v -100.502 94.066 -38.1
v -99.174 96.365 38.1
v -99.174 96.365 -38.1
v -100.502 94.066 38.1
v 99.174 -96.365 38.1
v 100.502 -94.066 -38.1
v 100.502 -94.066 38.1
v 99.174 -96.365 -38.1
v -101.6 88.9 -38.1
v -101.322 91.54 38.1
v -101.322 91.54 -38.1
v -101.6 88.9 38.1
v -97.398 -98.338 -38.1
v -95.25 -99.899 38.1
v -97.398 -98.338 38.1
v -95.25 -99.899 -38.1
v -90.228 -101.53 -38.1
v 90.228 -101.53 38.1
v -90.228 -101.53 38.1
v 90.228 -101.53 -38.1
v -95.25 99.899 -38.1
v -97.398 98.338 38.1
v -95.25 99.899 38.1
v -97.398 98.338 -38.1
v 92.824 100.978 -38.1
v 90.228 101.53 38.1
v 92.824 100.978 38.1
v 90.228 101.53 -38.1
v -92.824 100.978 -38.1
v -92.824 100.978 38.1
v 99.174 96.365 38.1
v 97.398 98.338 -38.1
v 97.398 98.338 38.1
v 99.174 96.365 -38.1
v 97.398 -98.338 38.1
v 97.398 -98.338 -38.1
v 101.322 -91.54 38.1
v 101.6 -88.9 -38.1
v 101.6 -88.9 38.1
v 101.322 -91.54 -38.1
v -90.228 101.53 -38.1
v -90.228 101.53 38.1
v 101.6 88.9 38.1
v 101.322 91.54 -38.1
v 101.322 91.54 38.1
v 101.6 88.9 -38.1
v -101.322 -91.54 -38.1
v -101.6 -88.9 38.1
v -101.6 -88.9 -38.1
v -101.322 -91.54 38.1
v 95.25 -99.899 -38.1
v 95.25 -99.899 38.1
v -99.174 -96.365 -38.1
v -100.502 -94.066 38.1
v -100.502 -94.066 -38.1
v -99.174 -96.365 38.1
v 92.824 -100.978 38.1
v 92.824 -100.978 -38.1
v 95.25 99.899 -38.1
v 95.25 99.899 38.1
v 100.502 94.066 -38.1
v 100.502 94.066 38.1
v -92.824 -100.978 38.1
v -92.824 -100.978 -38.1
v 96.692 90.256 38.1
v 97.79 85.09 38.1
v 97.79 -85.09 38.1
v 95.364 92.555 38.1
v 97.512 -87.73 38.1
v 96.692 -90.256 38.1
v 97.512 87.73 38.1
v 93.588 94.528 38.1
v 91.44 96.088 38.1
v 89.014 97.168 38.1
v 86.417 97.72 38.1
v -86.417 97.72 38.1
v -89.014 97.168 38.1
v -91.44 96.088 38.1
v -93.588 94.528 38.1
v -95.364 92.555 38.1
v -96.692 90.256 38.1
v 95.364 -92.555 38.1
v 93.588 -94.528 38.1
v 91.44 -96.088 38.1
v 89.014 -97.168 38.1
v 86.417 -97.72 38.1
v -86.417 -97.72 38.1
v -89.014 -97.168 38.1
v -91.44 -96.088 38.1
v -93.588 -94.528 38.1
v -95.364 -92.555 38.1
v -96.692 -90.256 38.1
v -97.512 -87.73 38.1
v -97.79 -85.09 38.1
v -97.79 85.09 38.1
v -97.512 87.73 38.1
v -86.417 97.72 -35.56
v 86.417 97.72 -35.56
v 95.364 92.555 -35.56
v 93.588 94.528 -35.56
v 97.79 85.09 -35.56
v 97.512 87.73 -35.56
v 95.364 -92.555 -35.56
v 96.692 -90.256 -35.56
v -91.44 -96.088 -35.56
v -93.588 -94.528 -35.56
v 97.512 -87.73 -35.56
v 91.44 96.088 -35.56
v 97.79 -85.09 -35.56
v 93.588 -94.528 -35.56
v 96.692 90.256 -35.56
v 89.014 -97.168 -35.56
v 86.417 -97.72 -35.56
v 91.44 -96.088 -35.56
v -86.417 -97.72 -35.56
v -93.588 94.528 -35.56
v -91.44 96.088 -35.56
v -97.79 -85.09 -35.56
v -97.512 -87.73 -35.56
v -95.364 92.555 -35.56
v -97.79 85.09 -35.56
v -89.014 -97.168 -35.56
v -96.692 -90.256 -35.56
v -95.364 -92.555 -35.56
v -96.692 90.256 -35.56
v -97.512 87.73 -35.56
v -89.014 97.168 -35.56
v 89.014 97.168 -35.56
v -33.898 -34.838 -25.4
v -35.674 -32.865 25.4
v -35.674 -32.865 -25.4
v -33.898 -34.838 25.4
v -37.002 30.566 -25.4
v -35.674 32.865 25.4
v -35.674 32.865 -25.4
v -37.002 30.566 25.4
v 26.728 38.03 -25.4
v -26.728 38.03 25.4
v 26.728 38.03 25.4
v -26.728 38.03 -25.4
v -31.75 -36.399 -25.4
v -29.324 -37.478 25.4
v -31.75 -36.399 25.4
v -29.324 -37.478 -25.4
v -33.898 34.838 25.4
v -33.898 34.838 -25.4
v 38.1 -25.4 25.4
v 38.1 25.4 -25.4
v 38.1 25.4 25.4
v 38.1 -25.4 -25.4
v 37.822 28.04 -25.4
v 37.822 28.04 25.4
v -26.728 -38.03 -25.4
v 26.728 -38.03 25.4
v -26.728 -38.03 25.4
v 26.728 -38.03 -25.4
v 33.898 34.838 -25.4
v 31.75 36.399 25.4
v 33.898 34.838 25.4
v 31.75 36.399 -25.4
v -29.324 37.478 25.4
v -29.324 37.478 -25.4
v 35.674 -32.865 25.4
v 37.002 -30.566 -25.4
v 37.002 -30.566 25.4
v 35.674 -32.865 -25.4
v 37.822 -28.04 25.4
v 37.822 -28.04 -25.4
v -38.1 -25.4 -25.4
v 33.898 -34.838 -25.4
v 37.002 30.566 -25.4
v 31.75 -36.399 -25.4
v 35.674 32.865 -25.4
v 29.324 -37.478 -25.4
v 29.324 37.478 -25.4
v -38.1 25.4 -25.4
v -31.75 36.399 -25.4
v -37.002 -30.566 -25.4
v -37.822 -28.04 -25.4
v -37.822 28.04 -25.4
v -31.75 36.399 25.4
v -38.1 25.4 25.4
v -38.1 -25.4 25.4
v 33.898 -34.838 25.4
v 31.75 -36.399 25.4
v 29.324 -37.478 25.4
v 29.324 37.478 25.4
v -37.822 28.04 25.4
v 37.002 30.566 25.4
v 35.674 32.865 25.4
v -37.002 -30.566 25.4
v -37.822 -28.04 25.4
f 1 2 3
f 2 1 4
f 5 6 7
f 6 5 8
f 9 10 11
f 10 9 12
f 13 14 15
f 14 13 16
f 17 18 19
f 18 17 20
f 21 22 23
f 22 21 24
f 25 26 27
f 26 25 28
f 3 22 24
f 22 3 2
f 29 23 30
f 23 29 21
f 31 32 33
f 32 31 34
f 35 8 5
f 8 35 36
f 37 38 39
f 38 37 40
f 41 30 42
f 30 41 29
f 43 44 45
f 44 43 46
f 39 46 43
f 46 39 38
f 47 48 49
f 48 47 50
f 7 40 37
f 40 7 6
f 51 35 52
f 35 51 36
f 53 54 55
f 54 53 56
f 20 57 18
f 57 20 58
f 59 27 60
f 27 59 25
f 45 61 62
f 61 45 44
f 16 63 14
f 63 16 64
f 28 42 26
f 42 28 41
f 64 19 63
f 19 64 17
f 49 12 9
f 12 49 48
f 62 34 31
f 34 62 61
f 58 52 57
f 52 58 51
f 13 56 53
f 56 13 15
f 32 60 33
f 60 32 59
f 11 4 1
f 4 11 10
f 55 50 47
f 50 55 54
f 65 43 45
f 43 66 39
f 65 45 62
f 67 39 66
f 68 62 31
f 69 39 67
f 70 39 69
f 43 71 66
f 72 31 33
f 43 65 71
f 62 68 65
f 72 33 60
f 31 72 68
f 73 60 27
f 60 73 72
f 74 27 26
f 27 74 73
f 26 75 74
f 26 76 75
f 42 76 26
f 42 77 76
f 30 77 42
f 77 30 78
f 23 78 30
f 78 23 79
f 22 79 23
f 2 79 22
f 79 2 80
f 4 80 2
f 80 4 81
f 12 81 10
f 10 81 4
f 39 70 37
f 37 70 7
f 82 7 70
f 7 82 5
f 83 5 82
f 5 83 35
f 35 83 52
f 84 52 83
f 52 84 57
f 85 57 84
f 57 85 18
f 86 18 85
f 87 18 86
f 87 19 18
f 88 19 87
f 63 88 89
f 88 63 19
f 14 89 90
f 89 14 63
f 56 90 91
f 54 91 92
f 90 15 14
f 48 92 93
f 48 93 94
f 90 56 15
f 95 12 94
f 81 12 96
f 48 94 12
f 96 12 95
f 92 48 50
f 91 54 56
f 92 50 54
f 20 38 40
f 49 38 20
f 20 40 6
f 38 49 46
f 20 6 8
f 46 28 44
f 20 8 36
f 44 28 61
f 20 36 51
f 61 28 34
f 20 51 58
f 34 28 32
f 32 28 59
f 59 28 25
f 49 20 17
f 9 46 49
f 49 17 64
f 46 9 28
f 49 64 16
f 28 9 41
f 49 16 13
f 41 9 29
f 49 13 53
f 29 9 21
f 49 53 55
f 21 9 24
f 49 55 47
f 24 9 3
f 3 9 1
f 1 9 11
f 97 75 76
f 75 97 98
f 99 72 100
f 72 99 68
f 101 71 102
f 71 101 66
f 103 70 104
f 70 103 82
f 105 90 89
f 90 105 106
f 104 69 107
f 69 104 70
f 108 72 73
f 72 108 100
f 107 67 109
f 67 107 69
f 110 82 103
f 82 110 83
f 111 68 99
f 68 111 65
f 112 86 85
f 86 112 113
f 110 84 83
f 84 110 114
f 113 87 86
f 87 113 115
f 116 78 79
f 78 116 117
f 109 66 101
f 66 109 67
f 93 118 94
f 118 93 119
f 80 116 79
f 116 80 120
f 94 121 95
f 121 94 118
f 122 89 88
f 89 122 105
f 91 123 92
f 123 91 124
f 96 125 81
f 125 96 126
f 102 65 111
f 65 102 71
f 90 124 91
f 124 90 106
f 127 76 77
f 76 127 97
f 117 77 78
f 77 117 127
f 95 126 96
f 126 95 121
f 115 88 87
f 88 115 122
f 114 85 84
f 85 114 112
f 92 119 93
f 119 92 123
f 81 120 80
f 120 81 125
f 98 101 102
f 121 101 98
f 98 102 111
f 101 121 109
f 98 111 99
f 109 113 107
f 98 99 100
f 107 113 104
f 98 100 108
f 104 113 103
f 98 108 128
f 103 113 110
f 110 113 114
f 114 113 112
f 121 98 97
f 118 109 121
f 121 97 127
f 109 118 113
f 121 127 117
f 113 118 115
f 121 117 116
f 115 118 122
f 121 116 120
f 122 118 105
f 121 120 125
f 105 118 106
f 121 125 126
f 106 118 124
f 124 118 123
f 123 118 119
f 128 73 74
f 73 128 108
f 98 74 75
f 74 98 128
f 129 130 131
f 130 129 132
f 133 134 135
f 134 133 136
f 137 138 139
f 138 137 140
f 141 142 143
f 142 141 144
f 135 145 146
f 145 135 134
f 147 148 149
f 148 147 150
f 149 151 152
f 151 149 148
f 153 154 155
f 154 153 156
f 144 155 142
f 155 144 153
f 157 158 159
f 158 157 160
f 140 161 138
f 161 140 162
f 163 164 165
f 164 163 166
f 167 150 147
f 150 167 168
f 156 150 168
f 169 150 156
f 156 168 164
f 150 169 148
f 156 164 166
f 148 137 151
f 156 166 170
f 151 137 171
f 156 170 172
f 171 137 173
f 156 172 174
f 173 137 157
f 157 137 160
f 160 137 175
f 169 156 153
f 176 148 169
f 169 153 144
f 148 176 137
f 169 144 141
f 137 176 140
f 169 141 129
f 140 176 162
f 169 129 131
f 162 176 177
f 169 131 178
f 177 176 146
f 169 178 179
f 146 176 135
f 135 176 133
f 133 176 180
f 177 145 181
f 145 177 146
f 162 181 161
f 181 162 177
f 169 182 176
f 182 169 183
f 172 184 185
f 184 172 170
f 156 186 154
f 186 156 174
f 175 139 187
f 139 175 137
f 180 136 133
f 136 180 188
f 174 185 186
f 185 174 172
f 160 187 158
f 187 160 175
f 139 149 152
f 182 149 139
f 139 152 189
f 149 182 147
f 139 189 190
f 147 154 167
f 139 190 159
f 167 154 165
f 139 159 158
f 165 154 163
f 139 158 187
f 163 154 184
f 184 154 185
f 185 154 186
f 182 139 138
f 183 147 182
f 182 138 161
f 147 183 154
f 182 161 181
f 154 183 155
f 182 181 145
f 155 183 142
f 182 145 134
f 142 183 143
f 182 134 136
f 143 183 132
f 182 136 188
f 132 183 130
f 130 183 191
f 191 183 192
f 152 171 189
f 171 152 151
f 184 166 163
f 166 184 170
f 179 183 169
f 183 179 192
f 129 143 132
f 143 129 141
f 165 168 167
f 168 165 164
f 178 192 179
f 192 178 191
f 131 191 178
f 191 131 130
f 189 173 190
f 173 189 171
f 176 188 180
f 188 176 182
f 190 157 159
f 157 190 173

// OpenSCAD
module rounded_cube(size, radius, center=false) {
	minkowski() {
		cylinder(r=radius, center=center);
		cube(size, center=center);
	}
}

function in2mm(v) = v * 25.4;

module scale_in2mm() {
	for (i = [0 : $children-1])
		scale([25.4, 25.4, 25.4])
			child(i);
}


$fn=30;

scale_in2mm() {
	difference() {
		rounded_cube([7, 7, 2], 0.5, center=true);
		translate([0, 0, 0.1]) {
			rounded_cube([6.7, 6.7, 2], 0.5, center=true);
		}
	}
	rounded_cube([2, 2, 1], 0.5, center=true);
}
